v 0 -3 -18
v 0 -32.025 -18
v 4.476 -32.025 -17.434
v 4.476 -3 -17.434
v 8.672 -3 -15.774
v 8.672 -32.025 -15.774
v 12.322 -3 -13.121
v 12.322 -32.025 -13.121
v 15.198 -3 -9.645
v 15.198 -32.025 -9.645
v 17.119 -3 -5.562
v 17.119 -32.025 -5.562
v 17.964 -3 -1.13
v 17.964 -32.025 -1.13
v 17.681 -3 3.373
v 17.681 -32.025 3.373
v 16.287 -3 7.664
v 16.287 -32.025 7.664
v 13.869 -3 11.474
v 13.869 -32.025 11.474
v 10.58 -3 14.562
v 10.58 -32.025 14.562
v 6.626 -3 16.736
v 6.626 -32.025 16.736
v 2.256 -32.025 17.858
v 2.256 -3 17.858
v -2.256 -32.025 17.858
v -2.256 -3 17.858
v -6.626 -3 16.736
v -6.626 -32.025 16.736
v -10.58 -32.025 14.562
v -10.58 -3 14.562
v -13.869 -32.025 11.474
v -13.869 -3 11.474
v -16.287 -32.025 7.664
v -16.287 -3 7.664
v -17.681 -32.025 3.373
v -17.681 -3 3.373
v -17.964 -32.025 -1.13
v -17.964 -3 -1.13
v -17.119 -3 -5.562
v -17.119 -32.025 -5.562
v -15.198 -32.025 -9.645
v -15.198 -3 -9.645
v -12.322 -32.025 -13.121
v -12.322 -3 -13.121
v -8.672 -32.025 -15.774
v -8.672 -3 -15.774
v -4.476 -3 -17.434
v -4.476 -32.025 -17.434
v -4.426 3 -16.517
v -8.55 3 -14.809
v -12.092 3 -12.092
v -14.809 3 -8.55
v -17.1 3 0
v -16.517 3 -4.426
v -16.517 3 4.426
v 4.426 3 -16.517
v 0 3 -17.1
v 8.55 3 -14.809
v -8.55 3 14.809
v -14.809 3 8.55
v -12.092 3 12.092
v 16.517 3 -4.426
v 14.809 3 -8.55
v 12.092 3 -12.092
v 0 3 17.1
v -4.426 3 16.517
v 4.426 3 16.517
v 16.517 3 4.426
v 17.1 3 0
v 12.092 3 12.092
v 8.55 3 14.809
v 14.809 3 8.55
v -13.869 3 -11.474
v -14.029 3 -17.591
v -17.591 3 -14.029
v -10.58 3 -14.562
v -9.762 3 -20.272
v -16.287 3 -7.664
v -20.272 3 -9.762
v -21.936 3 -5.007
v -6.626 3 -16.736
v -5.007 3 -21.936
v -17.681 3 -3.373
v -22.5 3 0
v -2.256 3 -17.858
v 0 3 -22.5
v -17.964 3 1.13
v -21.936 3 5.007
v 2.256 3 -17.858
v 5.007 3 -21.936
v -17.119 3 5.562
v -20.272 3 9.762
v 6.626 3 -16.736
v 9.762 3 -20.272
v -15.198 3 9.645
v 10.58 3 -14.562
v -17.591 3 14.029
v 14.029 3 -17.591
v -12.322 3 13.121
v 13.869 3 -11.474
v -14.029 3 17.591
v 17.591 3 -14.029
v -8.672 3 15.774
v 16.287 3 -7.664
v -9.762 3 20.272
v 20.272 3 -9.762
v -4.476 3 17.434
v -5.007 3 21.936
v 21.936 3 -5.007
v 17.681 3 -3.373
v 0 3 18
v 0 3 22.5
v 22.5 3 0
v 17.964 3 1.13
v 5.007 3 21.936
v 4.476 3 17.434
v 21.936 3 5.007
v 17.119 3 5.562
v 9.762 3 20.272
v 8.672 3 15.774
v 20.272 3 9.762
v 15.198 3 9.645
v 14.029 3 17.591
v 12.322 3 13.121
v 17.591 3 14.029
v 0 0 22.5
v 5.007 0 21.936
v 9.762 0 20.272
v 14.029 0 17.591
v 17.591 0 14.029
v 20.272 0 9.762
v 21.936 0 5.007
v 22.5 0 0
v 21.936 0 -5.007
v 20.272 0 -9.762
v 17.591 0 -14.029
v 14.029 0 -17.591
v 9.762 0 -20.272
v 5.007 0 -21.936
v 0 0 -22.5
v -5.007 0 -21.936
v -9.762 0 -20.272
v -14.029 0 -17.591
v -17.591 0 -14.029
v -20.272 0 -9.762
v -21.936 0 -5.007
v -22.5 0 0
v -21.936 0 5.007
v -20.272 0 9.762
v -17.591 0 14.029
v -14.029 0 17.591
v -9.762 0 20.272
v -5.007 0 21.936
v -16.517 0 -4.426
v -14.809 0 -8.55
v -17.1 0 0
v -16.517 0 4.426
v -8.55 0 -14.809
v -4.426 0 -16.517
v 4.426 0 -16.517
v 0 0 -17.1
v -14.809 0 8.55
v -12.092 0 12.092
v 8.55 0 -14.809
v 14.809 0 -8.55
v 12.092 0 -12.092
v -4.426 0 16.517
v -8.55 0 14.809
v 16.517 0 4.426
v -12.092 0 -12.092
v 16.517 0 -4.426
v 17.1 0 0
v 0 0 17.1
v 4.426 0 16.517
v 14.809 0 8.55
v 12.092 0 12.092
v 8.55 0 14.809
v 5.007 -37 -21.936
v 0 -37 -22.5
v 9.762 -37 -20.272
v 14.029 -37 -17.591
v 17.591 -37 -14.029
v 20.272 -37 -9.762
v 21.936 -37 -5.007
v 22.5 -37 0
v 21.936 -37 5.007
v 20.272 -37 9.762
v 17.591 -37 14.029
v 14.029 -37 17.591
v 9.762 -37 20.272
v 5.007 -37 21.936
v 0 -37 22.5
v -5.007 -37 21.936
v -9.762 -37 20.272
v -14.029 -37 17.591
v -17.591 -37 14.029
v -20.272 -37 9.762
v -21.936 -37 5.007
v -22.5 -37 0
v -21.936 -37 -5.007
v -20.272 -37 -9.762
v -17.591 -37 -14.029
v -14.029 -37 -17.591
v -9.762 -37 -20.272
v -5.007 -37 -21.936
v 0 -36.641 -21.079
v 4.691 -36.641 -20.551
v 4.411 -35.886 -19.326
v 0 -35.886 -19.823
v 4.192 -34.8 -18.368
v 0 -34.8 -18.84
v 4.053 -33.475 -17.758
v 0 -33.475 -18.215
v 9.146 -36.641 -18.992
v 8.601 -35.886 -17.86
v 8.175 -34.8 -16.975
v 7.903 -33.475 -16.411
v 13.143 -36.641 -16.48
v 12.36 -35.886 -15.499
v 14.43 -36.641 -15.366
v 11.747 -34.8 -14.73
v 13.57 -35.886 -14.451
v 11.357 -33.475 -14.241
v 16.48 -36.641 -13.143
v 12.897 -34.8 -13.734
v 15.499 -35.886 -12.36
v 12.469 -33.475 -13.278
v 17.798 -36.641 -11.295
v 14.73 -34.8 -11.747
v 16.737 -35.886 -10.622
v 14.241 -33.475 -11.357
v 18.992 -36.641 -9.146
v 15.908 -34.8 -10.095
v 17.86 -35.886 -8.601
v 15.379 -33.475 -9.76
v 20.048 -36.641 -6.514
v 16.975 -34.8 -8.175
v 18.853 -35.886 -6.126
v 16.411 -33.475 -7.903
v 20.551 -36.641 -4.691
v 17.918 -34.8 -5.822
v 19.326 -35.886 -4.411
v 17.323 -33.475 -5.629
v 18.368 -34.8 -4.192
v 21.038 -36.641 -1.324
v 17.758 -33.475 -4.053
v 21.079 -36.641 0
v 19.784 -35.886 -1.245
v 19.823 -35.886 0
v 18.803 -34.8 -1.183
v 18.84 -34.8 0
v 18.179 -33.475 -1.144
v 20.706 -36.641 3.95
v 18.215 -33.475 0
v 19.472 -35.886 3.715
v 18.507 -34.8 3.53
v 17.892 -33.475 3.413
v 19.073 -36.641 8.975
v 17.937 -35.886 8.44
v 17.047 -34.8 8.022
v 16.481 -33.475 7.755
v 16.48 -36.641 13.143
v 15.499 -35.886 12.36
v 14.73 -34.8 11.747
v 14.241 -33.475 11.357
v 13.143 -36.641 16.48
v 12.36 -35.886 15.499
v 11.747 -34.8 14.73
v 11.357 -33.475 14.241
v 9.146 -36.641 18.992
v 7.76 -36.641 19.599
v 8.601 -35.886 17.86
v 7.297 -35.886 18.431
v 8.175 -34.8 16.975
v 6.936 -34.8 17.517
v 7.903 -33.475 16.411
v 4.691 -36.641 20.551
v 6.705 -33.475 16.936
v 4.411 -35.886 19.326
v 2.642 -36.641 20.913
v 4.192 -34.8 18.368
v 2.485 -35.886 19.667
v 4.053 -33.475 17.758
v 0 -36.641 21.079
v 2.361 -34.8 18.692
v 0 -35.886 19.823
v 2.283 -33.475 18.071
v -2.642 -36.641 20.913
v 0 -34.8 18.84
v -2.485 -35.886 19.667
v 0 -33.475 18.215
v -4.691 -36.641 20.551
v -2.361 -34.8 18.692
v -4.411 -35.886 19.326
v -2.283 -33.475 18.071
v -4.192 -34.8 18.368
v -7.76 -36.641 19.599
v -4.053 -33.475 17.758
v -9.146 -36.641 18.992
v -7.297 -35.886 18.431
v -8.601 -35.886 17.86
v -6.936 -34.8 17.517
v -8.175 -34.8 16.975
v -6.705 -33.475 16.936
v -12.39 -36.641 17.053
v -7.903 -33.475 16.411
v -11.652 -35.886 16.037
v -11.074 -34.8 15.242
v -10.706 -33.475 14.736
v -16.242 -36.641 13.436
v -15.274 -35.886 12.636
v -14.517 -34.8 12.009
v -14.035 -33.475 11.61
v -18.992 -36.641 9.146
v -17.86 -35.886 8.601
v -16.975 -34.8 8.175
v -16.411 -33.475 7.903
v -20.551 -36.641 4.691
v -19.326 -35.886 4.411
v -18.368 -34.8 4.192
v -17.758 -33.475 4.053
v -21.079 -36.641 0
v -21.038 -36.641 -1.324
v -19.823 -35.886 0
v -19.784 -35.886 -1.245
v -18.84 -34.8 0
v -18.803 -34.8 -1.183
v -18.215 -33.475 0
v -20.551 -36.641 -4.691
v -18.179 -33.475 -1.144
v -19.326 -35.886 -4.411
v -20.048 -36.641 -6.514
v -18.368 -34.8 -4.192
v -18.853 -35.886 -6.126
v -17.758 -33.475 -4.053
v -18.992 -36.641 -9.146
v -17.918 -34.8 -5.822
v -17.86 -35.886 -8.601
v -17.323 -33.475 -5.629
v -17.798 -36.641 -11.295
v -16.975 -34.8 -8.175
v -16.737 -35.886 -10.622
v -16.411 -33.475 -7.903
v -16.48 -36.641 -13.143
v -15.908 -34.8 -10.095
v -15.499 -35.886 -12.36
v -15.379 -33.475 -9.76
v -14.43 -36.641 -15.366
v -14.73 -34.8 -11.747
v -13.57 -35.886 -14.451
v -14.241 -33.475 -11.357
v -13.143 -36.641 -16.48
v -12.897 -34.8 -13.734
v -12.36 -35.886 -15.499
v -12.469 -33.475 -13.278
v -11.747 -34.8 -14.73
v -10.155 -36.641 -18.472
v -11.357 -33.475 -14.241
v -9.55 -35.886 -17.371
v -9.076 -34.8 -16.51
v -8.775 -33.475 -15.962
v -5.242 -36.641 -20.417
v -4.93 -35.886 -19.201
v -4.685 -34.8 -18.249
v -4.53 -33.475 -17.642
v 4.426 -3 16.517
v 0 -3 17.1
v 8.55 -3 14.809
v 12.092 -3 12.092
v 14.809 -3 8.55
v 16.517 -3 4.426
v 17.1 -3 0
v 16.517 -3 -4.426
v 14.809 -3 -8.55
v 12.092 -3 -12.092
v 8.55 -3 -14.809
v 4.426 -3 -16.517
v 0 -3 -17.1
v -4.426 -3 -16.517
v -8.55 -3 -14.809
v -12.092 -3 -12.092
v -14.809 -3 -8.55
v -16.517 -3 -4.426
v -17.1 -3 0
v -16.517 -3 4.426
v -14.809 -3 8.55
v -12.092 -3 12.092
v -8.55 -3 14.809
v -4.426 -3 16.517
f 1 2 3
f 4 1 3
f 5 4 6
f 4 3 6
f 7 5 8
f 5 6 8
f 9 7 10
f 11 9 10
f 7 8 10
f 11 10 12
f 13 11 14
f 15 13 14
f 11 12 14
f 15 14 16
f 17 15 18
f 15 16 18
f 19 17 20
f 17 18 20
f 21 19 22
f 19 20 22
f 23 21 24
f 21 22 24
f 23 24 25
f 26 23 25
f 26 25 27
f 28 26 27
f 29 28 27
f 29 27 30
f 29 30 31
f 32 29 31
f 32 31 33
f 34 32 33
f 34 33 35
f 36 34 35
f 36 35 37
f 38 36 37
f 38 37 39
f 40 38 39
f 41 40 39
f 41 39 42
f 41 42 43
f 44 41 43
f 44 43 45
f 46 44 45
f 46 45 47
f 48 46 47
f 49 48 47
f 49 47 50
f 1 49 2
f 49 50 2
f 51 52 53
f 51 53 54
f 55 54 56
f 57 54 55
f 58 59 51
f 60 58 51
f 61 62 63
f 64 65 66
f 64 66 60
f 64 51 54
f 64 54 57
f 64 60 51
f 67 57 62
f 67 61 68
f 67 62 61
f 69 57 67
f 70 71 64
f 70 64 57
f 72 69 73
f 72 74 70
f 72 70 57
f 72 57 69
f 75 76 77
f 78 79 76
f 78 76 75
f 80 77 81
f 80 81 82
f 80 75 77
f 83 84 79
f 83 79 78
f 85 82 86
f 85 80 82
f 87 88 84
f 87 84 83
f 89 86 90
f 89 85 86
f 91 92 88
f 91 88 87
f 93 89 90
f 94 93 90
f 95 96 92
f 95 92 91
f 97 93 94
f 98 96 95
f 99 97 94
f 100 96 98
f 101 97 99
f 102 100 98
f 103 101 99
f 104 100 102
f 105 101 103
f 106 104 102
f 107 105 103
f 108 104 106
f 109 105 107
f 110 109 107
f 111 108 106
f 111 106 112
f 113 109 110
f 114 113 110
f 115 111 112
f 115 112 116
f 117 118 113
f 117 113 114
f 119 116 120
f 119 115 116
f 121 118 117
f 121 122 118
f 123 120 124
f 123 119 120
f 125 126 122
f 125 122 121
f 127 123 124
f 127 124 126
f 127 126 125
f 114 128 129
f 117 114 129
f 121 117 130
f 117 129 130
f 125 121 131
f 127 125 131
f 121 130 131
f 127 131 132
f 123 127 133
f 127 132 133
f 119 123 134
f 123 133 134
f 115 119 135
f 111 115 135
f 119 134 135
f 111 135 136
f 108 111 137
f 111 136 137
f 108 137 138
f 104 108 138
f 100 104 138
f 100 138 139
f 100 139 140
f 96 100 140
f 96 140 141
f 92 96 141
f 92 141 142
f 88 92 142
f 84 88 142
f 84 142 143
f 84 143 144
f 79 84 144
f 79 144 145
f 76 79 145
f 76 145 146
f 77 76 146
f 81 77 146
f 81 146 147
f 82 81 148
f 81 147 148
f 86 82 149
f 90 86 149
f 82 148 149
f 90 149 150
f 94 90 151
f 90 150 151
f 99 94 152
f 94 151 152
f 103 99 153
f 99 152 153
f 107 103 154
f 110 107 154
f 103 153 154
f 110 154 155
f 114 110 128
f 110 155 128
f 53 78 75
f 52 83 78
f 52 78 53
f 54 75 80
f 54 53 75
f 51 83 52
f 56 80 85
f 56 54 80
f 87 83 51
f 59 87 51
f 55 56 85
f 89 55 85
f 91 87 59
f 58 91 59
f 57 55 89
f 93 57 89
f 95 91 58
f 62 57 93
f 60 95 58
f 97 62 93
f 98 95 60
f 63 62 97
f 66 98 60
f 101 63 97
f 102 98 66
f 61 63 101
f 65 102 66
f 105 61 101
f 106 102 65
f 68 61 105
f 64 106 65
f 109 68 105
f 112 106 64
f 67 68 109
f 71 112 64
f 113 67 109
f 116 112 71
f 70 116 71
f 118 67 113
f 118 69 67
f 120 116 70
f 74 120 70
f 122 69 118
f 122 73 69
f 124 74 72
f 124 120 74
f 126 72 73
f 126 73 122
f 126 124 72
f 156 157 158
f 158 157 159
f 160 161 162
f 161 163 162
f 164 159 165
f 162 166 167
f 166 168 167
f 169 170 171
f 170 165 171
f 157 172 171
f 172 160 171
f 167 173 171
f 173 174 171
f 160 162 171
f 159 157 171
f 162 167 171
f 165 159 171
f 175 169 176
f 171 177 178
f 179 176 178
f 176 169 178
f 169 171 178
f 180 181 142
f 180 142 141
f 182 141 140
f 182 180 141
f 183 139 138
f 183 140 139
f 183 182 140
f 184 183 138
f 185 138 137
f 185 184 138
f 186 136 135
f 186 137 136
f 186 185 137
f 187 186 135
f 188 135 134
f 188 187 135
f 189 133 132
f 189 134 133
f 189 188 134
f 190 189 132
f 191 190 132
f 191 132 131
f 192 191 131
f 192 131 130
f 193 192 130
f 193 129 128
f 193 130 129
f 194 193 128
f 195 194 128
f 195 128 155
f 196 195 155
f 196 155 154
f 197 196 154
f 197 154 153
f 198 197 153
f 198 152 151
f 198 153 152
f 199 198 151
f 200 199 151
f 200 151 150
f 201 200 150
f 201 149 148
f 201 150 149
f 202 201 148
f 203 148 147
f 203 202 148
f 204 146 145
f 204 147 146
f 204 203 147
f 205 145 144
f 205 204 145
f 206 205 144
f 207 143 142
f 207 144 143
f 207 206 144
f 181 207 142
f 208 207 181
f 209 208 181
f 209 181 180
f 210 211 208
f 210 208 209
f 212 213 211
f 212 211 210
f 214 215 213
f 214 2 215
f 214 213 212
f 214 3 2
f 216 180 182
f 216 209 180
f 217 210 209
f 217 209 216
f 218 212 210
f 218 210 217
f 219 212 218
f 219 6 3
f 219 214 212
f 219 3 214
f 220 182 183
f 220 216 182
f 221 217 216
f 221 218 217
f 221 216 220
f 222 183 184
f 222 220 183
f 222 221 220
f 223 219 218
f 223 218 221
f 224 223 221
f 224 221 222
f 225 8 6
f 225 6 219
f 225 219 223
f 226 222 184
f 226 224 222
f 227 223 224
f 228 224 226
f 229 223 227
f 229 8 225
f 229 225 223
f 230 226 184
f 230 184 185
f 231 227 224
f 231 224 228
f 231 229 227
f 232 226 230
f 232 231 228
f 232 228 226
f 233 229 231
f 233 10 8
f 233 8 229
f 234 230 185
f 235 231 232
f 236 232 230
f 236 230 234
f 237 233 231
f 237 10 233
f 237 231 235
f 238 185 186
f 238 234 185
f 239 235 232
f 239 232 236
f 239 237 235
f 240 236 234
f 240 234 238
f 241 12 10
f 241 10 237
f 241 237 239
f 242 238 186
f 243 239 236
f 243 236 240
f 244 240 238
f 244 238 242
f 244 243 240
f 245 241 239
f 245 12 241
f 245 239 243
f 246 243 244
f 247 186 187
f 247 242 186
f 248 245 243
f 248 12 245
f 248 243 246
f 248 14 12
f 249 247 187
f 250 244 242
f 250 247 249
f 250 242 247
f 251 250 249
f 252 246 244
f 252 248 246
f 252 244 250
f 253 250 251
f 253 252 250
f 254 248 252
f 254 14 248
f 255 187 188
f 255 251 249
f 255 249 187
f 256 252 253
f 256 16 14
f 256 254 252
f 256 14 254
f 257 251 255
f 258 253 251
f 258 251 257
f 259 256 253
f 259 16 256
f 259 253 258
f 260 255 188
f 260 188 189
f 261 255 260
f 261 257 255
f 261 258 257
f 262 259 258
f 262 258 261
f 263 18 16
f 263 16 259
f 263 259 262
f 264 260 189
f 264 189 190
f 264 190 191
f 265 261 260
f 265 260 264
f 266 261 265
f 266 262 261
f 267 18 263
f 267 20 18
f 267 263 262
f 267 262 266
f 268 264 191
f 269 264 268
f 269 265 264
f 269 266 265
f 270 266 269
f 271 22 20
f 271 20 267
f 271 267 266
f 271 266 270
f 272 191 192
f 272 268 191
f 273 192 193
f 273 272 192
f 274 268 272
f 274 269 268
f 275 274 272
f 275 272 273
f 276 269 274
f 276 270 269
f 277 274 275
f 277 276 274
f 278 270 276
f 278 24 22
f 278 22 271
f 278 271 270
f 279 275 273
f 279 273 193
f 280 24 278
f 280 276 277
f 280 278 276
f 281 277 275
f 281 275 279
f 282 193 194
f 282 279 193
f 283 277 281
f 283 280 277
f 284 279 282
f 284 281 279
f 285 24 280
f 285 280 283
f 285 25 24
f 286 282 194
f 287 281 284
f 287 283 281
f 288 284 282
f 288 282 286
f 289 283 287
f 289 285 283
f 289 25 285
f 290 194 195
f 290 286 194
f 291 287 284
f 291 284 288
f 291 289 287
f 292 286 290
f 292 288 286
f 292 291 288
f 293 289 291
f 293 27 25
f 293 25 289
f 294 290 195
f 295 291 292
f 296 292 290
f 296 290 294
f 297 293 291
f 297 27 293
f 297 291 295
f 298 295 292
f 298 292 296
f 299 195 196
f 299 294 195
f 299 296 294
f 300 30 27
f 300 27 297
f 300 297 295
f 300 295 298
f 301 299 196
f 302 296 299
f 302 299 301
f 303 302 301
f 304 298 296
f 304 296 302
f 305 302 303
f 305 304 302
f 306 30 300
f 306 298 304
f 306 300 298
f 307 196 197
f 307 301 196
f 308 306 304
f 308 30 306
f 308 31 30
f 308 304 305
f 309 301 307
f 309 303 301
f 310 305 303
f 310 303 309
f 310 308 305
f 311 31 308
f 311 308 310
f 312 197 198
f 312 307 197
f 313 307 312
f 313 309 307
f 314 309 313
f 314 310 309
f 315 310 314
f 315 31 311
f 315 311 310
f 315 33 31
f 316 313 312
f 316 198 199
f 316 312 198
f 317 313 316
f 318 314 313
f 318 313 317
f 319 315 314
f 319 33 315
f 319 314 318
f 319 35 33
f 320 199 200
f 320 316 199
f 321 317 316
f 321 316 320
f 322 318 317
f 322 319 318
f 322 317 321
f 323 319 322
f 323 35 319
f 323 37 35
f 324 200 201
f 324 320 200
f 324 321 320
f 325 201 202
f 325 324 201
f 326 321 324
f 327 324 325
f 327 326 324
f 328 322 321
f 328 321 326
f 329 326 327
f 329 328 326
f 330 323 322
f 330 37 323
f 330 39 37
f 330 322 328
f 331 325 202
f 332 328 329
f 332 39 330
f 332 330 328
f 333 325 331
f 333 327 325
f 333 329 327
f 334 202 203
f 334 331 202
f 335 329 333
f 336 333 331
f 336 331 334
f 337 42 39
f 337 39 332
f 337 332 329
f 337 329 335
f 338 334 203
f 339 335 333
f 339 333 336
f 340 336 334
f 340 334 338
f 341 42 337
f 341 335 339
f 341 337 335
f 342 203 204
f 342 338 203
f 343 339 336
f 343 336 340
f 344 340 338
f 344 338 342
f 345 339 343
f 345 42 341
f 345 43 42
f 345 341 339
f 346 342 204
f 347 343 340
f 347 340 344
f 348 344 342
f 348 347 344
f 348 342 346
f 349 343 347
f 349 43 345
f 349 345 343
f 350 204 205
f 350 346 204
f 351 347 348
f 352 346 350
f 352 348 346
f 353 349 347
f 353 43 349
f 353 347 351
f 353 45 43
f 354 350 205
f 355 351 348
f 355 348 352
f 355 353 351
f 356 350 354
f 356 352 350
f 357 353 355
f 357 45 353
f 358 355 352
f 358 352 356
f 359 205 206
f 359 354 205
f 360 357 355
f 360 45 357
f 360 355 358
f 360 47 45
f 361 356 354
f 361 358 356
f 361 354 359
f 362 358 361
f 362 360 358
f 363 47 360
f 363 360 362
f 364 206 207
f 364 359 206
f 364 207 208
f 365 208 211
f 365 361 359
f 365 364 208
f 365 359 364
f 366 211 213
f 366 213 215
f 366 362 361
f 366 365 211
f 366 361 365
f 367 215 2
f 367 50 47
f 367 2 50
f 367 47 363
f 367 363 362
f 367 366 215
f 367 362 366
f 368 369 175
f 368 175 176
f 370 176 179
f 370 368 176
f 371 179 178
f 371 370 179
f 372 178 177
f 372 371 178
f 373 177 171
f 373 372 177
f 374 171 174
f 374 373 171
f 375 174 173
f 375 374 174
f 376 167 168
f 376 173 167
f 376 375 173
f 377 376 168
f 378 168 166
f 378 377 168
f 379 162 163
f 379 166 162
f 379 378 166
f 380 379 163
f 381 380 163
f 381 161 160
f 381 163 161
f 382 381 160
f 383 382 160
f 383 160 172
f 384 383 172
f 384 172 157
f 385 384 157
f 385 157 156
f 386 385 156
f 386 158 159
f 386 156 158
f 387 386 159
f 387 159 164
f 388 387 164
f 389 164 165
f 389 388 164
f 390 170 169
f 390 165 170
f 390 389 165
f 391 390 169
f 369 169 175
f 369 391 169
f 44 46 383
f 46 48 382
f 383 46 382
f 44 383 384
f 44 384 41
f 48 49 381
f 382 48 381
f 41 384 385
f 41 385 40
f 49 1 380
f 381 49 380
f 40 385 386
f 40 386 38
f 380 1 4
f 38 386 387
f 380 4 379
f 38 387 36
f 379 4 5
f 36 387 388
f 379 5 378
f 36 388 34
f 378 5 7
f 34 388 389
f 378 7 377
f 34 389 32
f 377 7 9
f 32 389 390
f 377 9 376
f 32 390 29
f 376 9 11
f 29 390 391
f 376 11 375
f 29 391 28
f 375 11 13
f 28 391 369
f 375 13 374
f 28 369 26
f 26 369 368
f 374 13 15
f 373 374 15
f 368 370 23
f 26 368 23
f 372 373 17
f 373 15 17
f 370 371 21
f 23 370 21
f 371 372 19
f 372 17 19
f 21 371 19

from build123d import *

# Parameters (mm, degrees)
SKETCH1_R           = 22.5
BOSS_EXTRUDE1_DEPTH = 3
BOSS_EXTRUDE2_START = 37
SKETCH2_R           = 22.5
SKETCH2_R_2         = 18
BOSS_EXTRUDE2_DEPTH = 37
FILLET1_R           = 5
BOSS_EXTRUDE3_START = -6
SKETCH3_R           = 18
SKETCH3_R_2         = 17.100000000000033
BOSS_EXTRUDE3_DEPTH = 6


with BuildPart() as part:
    # Sketch1 → Boss-Extrude1 (new body)
    with BuildSketch(Plane(origin=(0, 0, 0), x_dir=(1, 0, 0), z_dir=(0, 1, 0))):
        with Locations(Location((0, 0, 0), (0, 0, 270))):
            Circle(SKETCH1_R)
    extrude(amount=BOSS_EXTRUDE1_DEPTH)

    # Sketch2 → Boss-Extrude2 (add)
    with BuildSketch(Plane(origin=(0, 0, 0), x_dir=(-1, 0, 0), z_dir=(0, -1, 0)).offset(BOSS_EXTRUDE2_START)):
        with Locations(Location((0, 0, 0), (0, 0, 90))):
            Circle(SKETCH2_R)
        with Locations(Location((0, 0, 0), (0, 0, 90))):
            Circle(SKETCH2_R_2, mode=Mode.SUBTRACT)
    extrude(amount=-BOSS_EXTRUDE2_DEPTH)

    # Fillet1
    # the kernel refuses this fillet: 5 mm, written as the material it takes off along each edge
    with BuildSketch(Plane(origin=(0, -37, 0), x_dir=(-6e-17, 0, -1), z_dir=(-1, 0, 6e-17))) as fillet1_piece_1:
        with BuildLine():
            CenterArc((23, -4.974937185533101), FILLET1_R, 95.73917047726678, 84.26082952273322)
            Line((18, -4.974937185533101), (17.9, -4.974937185533101))
            Line((17.9, -4.974937185533101), (17.9, 0))
            Line((17.9, 0), (18, 0.10000000000000142))
            ThreePointArc((18, 0.10000000000000142), (20.25, 0.10000000000000142), (22.49, 0.09949874371066159))
            Line((22.49, 0.09949874371066159), (22.5, 0))
        make_face()
    revolve(axis=Axis((0, -37, 0), (0, -1, 0)), mode=Mode.SUBTRACT)

    # Sketch3 → Boss-Extrude3 (add)
    with BuildSketch(Plane(origin=(0, 3, 0), x_dir=(1, 0, 0), z_dir=(0, 1, 0)).offset(BOSS_EXTRUDE3_START)):
        with Locations(Location((0, 0, 0), (0, 0, 270))):
            Circle(SKETCH3_R)
        with Locations(Location((0, 0, 0), (0, 0, 270))):
            Circle(SKETCH3_R_2, mode=Mode.SUBTRACT)
    extrude(amount=BOSS_EXTRUDE3_DEPTH)


solid = part.part
